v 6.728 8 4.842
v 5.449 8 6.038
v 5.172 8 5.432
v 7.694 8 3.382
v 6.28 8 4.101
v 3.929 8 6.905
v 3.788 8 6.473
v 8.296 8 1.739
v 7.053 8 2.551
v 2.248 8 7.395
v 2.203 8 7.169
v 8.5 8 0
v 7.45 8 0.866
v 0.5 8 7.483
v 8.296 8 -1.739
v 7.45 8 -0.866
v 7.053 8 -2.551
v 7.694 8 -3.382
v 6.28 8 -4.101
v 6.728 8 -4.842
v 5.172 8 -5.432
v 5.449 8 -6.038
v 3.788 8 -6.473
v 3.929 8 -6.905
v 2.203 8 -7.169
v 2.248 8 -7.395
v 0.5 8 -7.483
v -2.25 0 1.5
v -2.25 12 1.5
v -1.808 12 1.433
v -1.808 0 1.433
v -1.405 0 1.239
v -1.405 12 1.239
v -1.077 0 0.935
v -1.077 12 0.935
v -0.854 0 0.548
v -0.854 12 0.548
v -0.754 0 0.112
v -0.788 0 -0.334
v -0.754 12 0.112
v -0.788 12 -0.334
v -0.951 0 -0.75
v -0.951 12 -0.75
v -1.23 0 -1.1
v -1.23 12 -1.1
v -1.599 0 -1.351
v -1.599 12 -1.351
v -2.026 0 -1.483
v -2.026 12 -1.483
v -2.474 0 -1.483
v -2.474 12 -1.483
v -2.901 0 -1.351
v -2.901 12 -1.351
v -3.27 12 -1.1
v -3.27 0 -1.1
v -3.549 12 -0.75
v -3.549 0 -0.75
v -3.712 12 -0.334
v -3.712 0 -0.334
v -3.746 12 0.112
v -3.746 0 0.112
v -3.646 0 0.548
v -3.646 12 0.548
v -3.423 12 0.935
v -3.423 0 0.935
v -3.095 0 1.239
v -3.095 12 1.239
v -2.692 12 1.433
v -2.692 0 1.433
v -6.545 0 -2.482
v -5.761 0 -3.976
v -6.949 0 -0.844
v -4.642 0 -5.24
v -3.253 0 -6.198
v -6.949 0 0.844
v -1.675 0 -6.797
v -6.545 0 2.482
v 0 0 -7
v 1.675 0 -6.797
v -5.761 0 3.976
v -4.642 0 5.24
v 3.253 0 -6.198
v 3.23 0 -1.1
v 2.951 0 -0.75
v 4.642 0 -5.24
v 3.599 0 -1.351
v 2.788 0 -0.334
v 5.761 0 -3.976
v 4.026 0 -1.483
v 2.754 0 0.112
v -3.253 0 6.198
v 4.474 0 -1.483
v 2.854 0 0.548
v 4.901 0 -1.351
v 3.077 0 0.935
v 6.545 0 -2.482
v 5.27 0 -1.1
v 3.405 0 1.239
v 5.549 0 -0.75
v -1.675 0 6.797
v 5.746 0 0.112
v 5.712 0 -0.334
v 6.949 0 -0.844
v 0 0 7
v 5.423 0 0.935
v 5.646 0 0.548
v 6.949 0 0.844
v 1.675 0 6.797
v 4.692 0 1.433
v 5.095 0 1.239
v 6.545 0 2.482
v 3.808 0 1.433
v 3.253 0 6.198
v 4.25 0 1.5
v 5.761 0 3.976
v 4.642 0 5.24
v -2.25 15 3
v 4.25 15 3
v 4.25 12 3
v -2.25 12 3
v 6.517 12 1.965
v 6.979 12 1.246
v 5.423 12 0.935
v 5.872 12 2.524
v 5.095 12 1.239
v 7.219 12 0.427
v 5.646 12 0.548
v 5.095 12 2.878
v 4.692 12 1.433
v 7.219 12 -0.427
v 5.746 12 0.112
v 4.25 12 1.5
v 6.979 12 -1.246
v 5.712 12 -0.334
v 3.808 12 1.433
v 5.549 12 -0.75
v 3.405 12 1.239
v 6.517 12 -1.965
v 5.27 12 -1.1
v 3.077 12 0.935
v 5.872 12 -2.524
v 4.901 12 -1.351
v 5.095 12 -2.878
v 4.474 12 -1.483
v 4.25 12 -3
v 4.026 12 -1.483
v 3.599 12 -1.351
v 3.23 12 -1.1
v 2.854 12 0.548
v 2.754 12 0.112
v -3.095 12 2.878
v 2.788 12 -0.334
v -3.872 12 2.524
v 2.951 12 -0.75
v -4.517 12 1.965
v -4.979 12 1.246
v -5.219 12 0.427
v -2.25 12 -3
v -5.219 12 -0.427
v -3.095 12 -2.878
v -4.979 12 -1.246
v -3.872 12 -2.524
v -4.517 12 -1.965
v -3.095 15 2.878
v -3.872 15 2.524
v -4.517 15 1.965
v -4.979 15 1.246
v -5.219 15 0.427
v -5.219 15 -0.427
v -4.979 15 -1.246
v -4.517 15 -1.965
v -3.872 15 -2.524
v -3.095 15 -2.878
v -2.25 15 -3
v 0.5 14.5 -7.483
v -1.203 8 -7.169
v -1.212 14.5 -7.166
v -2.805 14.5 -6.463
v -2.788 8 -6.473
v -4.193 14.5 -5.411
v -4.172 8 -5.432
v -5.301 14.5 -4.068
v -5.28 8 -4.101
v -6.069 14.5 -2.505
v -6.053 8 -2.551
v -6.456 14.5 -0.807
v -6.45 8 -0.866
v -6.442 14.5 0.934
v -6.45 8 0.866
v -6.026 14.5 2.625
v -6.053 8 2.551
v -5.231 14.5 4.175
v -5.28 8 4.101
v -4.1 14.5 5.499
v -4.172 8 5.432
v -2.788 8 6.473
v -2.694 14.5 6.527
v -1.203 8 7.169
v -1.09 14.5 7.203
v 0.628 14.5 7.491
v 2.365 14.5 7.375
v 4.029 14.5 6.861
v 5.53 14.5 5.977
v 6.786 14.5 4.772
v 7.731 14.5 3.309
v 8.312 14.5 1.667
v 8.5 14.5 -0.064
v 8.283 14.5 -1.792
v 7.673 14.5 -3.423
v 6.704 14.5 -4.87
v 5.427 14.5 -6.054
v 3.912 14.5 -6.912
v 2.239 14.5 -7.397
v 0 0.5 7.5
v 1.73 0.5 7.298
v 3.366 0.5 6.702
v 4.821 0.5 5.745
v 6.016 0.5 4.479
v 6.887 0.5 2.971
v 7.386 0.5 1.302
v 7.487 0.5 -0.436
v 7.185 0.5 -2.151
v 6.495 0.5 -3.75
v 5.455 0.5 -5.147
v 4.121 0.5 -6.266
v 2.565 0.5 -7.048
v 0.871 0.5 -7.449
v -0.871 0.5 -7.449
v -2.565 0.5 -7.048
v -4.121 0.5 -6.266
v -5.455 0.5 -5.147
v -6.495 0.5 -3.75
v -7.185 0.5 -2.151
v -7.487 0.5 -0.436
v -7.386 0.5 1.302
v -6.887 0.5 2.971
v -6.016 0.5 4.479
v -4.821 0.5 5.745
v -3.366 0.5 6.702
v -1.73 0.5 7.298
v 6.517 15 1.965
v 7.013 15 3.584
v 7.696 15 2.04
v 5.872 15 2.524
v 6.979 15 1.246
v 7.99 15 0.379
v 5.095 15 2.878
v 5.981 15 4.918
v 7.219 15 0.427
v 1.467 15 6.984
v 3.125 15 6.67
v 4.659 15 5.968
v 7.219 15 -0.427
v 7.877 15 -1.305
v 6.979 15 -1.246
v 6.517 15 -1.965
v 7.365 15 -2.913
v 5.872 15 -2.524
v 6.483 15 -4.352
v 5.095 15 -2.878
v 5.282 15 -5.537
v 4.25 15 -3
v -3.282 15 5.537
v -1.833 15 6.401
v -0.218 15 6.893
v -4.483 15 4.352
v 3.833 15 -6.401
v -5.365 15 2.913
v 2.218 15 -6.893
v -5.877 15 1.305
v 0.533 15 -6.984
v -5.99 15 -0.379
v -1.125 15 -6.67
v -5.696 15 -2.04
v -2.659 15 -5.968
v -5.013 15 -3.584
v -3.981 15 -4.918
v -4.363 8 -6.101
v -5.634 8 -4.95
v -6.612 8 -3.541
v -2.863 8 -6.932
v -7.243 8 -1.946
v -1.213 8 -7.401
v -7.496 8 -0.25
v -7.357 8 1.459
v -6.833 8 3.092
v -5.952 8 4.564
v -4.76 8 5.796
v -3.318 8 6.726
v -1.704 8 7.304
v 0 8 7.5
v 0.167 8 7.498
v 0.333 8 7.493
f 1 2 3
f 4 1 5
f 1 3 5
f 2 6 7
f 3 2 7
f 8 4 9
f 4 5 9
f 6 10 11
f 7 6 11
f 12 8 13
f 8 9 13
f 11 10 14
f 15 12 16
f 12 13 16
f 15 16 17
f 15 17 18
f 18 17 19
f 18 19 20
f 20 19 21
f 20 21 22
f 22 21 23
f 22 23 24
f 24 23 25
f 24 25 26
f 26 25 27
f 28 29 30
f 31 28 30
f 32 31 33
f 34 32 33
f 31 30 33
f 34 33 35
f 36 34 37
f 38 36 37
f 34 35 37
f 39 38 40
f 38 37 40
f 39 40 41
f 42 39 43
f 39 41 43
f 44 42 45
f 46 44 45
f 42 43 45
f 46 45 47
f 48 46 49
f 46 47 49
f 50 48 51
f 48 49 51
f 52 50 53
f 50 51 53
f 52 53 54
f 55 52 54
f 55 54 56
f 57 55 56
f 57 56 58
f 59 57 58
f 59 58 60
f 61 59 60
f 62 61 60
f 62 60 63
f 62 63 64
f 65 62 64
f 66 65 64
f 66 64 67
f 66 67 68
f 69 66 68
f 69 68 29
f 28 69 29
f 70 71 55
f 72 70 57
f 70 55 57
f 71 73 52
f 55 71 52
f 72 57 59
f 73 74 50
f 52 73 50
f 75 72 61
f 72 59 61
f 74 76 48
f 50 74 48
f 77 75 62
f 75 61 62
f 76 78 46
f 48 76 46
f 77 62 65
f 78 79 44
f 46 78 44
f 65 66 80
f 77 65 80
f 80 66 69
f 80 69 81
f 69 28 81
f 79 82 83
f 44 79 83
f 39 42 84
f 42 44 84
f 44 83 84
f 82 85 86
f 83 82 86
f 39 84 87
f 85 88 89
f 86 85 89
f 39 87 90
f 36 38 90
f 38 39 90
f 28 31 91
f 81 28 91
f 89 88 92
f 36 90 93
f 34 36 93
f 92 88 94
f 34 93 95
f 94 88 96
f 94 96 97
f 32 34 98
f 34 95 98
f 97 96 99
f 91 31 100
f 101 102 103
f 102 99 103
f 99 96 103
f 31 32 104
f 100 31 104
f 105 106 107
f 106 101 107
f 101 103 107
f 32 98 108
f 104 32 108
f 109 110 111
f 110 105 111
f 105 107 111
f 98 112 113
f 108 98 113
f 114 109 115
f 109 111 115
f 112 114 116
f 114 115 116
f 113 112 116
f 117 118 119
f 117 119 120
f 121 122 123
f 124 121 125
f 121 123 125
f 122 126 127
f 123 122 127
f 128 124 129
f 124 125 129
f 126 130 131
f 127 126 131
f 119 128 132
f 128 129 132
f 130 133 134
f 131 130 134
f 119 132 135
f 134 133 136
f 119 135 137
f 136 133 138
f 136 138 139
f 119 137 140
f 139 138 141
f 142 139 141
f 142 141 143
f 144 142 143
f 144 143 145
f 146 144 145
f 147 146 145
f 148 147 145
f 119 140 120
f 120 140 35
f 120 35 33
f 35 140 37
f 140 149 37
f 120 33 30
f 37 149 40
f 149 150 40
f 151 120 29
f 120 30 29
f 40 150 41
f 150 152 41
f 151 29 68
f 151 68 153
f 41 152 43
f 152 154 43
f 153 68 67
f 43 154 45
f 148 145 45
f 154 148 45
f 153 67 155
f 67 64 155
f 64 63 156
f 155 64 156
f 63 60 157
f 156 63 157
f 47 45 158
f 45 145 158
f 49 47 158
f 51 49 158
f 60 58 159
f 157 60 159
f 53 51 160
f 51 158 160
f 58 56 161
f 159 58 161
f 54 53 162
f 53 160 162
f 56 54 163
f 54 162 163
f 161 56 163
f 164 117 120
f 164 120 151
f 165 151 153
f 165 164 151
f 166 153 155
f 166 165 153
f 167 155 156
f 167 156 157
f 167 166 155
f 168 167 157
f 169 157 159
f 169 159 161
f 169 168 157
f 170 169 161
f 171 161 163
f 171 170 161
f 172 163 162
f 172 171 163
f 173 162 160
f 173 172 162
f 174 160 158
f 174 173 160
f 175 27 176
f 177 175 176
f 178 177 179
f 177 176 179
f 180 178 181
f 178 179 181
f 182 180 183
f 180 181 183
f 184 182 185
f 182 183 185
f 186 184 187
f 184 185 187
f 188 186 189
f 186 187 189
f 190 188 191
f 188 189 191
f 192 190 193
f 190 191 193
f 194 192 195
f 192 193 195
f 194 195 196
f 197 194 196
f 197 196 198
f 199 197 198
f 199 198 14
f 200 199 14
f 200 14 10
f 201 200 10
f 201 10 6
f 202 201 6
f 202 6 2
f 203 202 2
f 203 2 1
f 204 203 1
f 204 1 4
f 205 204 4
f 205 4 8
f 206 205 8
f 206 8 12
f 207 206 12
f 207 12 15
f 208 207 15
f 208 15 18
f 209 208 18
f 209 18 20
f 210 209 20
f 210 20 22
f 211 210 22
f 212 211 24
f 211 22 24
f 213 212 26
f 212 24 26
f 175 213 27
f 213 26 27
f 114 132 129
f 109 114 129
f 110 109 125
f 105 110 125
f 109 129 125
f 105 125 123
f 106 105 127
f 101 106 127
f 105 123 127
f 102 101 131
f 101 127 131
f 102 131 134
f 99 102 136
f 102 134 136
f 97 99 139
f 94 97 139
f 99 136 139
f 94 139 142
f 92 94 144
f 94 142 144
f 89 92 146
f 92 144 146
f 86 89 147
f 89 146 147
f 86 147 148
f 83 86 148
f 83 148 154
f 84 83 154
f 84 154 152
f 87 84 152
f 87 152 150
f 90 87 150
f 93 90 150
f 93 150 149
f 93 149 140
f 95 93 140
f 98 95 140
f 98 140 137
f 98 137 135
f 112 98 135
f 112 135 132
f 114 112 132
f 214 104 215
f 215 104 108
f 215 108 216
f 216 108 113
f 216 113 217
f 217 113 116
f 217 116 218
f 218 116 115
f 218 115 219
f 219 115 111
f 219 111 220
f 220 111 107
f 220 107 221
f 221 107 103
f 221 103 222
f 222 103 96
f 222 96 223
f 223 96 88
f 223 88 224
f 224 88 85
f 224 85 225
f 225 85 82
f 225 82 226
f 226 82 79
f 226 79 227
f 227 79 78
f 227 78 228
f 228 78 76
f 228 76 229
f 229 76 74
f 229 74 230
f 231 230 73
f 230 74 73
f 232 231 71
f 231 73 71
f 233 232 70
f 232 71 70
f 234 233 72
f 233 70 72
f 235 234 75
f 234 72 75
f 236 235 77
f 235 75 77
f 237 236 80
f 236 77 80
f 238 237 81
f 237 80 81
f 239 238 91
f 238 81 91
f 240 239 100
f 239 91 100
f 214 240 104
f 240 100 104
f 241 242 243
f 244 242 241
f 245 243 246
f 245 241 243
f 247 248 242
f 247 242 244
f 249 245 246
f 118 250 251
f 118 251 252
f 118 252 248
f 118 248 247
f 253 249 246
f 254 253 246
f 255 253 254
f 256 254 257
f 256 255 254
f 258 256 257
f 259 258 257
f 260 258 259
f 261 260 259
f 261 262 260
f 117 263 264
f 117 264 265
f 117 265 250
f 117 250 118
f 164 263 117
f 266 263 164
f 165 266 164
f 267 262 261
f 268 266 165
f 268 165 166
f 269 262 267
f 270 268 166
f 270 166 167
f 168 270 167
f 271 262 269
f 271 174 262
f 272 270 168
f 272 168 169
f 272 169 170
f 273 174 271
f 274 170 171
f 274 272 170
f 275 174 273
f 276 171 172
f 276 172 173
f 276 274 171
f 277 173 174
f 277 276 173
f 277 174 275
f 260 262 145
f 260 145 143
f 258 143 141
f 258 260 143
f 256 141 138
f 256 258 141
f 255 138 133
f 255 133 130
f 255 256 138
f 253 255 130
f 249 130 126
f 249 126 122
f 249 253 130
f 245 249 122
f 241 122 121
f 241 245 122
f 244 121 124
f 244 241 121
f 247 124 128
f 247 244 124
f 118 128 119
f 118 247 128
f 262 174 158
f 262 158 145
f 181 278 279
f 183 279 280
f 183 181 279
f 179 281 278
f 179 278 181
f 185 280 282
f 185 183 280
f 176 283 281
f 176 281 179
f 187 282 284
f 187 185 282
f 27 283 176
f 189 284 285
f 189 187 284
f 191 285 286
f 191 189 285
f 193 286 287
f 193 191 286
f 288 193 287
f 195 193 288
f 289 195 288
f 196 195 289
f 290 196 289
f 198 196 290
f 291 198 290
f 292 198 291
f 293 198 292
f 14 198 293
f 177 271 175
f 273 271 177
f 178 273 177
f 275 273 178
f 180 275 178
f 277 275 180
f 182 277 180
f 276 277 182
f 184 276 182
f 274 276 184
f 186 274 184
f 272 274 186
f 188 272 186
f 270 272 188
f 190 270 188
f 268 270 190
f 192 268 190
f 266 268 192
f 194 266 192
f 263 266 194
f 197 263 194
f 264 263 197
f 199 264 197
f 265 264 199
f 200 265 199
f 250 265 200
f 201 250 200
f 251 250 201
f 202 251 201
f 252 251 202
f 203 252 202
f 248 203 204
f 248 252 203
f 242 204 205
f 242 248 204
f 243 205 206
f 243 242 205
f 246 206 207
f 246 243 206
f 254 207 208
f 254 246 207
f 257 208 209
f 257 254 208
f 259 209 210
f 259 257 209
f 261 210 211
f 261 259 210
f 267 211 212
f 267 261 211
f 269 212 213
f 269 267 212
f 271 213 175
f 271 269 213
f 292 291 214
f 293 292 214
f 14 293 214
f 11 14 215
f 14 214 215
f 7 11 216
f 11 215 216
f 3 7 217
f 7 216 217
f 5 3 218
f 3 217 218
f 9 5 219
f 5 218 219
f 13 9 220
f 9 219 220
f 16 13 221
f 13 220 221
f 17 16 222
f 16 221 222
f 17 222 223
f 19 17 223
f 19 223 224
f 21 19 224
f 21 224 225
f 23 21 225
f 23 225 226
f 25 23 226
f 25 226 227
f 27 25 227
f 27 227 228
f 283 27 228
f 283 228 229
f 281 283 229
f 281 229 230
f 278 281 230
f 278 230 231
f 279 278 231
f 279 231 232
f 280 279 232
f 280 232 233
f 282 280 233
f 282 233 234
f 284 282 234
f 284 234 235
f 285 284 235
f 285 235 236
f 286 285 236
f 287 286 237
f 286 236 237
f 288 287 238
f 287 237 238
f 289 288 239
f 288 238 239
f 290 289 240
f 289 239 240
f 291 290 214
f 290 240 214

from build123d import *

# Parameters (mm, degrees)
SKETCH1_R           = 7.5
BOSS_EXTRUDE1_DEPTH = 8
SKETCH2_R           = 7.5
BOSS_EXTRUDE2_DEPTH = 7
SKETCH3_R           = 1.5
CUT_EXTRUDE1_DEPTH  = 19.801595677
CUT_EXTRUDE3_DEPTH  = 3
CHAMFER1_SIZE       = 0.5


with BuildPart() as part:
    # Sketch1 → Boss-Extrude1 (new body)
    with BuildSketch(Plane(origin=(0, 0, 0), x_dir=(1, 0, 0), z_dir=(0, 1, 0))):
        with Locations(Location((0, 0, 0), (0, 0, 270))):
            Circle(SKETCH1_R)
    extrude(amount=BOSS_EXTRUDE1_DEPTH)

    # Sketch2 → Boss-Extrude2 (add)
    with BuildSketch(Plane(origin=(0, 8, 0), x_dir=(1, 0, 0), z_dir=(0, 1, 0))):
        with Locations(Location((1, 0, 0), (0, 0, 93.822553729))):
            Circle(SKETCH2_R)
    extrude(amount=BOSS_EXTRUDE2_DEPTH)

    # Sketch3 → Cut-Extrude1 (cut, through all)
    with BuildSketch(Plane(origin=(0, 15, 0), x_dir=(1, 0, 0), z_dir=(0, 1, 0))):
        with Locations(Location((-2.25, 0, 0), (0, 0, 270))):
            Circle(SKETCH3_R)
        with Locations(Location((4.25, 0, 0), (0, 0, 270))):
            Circle(SKETCH3_R)
    extrude(amount=-CUT_EXTRUDE1_DEPTH, mode=Mode.SUBTRACT)

    # Sketch5 → Cut-Extrude3 (cut)
    with BuildSketch(Plane(origin=(0, 15, 0), x_dir=(1, 0, 0), z_dir=(0, 1, 0))):
        with BuildLine():
            Line((-2.25, 3), (4.25, 3))
            ThreePointArc((4.25, 3), (7.25, 0), (4.25, -3))
            Line((4.25, -3), (-2.25, -3))
            ThreePointArc((-2.25, -3), (-5.25, 0), (-2.25, 3))
        make_face()
    extrude(amount=-CUT_EXTRUDE3_DEPTH, mode=Mode.SUBTRACT)

    # Chamfer1
    chamfer1_edges = [part.edges().sort_by_distance(p)[0] for p in [
        (0, 0, -7.5),
        (1.5, 15, 7.483314774),
    ]]
    chamfer(chamfer1_edges, length=CHAMFER1_SIZE)


solid = part.part
